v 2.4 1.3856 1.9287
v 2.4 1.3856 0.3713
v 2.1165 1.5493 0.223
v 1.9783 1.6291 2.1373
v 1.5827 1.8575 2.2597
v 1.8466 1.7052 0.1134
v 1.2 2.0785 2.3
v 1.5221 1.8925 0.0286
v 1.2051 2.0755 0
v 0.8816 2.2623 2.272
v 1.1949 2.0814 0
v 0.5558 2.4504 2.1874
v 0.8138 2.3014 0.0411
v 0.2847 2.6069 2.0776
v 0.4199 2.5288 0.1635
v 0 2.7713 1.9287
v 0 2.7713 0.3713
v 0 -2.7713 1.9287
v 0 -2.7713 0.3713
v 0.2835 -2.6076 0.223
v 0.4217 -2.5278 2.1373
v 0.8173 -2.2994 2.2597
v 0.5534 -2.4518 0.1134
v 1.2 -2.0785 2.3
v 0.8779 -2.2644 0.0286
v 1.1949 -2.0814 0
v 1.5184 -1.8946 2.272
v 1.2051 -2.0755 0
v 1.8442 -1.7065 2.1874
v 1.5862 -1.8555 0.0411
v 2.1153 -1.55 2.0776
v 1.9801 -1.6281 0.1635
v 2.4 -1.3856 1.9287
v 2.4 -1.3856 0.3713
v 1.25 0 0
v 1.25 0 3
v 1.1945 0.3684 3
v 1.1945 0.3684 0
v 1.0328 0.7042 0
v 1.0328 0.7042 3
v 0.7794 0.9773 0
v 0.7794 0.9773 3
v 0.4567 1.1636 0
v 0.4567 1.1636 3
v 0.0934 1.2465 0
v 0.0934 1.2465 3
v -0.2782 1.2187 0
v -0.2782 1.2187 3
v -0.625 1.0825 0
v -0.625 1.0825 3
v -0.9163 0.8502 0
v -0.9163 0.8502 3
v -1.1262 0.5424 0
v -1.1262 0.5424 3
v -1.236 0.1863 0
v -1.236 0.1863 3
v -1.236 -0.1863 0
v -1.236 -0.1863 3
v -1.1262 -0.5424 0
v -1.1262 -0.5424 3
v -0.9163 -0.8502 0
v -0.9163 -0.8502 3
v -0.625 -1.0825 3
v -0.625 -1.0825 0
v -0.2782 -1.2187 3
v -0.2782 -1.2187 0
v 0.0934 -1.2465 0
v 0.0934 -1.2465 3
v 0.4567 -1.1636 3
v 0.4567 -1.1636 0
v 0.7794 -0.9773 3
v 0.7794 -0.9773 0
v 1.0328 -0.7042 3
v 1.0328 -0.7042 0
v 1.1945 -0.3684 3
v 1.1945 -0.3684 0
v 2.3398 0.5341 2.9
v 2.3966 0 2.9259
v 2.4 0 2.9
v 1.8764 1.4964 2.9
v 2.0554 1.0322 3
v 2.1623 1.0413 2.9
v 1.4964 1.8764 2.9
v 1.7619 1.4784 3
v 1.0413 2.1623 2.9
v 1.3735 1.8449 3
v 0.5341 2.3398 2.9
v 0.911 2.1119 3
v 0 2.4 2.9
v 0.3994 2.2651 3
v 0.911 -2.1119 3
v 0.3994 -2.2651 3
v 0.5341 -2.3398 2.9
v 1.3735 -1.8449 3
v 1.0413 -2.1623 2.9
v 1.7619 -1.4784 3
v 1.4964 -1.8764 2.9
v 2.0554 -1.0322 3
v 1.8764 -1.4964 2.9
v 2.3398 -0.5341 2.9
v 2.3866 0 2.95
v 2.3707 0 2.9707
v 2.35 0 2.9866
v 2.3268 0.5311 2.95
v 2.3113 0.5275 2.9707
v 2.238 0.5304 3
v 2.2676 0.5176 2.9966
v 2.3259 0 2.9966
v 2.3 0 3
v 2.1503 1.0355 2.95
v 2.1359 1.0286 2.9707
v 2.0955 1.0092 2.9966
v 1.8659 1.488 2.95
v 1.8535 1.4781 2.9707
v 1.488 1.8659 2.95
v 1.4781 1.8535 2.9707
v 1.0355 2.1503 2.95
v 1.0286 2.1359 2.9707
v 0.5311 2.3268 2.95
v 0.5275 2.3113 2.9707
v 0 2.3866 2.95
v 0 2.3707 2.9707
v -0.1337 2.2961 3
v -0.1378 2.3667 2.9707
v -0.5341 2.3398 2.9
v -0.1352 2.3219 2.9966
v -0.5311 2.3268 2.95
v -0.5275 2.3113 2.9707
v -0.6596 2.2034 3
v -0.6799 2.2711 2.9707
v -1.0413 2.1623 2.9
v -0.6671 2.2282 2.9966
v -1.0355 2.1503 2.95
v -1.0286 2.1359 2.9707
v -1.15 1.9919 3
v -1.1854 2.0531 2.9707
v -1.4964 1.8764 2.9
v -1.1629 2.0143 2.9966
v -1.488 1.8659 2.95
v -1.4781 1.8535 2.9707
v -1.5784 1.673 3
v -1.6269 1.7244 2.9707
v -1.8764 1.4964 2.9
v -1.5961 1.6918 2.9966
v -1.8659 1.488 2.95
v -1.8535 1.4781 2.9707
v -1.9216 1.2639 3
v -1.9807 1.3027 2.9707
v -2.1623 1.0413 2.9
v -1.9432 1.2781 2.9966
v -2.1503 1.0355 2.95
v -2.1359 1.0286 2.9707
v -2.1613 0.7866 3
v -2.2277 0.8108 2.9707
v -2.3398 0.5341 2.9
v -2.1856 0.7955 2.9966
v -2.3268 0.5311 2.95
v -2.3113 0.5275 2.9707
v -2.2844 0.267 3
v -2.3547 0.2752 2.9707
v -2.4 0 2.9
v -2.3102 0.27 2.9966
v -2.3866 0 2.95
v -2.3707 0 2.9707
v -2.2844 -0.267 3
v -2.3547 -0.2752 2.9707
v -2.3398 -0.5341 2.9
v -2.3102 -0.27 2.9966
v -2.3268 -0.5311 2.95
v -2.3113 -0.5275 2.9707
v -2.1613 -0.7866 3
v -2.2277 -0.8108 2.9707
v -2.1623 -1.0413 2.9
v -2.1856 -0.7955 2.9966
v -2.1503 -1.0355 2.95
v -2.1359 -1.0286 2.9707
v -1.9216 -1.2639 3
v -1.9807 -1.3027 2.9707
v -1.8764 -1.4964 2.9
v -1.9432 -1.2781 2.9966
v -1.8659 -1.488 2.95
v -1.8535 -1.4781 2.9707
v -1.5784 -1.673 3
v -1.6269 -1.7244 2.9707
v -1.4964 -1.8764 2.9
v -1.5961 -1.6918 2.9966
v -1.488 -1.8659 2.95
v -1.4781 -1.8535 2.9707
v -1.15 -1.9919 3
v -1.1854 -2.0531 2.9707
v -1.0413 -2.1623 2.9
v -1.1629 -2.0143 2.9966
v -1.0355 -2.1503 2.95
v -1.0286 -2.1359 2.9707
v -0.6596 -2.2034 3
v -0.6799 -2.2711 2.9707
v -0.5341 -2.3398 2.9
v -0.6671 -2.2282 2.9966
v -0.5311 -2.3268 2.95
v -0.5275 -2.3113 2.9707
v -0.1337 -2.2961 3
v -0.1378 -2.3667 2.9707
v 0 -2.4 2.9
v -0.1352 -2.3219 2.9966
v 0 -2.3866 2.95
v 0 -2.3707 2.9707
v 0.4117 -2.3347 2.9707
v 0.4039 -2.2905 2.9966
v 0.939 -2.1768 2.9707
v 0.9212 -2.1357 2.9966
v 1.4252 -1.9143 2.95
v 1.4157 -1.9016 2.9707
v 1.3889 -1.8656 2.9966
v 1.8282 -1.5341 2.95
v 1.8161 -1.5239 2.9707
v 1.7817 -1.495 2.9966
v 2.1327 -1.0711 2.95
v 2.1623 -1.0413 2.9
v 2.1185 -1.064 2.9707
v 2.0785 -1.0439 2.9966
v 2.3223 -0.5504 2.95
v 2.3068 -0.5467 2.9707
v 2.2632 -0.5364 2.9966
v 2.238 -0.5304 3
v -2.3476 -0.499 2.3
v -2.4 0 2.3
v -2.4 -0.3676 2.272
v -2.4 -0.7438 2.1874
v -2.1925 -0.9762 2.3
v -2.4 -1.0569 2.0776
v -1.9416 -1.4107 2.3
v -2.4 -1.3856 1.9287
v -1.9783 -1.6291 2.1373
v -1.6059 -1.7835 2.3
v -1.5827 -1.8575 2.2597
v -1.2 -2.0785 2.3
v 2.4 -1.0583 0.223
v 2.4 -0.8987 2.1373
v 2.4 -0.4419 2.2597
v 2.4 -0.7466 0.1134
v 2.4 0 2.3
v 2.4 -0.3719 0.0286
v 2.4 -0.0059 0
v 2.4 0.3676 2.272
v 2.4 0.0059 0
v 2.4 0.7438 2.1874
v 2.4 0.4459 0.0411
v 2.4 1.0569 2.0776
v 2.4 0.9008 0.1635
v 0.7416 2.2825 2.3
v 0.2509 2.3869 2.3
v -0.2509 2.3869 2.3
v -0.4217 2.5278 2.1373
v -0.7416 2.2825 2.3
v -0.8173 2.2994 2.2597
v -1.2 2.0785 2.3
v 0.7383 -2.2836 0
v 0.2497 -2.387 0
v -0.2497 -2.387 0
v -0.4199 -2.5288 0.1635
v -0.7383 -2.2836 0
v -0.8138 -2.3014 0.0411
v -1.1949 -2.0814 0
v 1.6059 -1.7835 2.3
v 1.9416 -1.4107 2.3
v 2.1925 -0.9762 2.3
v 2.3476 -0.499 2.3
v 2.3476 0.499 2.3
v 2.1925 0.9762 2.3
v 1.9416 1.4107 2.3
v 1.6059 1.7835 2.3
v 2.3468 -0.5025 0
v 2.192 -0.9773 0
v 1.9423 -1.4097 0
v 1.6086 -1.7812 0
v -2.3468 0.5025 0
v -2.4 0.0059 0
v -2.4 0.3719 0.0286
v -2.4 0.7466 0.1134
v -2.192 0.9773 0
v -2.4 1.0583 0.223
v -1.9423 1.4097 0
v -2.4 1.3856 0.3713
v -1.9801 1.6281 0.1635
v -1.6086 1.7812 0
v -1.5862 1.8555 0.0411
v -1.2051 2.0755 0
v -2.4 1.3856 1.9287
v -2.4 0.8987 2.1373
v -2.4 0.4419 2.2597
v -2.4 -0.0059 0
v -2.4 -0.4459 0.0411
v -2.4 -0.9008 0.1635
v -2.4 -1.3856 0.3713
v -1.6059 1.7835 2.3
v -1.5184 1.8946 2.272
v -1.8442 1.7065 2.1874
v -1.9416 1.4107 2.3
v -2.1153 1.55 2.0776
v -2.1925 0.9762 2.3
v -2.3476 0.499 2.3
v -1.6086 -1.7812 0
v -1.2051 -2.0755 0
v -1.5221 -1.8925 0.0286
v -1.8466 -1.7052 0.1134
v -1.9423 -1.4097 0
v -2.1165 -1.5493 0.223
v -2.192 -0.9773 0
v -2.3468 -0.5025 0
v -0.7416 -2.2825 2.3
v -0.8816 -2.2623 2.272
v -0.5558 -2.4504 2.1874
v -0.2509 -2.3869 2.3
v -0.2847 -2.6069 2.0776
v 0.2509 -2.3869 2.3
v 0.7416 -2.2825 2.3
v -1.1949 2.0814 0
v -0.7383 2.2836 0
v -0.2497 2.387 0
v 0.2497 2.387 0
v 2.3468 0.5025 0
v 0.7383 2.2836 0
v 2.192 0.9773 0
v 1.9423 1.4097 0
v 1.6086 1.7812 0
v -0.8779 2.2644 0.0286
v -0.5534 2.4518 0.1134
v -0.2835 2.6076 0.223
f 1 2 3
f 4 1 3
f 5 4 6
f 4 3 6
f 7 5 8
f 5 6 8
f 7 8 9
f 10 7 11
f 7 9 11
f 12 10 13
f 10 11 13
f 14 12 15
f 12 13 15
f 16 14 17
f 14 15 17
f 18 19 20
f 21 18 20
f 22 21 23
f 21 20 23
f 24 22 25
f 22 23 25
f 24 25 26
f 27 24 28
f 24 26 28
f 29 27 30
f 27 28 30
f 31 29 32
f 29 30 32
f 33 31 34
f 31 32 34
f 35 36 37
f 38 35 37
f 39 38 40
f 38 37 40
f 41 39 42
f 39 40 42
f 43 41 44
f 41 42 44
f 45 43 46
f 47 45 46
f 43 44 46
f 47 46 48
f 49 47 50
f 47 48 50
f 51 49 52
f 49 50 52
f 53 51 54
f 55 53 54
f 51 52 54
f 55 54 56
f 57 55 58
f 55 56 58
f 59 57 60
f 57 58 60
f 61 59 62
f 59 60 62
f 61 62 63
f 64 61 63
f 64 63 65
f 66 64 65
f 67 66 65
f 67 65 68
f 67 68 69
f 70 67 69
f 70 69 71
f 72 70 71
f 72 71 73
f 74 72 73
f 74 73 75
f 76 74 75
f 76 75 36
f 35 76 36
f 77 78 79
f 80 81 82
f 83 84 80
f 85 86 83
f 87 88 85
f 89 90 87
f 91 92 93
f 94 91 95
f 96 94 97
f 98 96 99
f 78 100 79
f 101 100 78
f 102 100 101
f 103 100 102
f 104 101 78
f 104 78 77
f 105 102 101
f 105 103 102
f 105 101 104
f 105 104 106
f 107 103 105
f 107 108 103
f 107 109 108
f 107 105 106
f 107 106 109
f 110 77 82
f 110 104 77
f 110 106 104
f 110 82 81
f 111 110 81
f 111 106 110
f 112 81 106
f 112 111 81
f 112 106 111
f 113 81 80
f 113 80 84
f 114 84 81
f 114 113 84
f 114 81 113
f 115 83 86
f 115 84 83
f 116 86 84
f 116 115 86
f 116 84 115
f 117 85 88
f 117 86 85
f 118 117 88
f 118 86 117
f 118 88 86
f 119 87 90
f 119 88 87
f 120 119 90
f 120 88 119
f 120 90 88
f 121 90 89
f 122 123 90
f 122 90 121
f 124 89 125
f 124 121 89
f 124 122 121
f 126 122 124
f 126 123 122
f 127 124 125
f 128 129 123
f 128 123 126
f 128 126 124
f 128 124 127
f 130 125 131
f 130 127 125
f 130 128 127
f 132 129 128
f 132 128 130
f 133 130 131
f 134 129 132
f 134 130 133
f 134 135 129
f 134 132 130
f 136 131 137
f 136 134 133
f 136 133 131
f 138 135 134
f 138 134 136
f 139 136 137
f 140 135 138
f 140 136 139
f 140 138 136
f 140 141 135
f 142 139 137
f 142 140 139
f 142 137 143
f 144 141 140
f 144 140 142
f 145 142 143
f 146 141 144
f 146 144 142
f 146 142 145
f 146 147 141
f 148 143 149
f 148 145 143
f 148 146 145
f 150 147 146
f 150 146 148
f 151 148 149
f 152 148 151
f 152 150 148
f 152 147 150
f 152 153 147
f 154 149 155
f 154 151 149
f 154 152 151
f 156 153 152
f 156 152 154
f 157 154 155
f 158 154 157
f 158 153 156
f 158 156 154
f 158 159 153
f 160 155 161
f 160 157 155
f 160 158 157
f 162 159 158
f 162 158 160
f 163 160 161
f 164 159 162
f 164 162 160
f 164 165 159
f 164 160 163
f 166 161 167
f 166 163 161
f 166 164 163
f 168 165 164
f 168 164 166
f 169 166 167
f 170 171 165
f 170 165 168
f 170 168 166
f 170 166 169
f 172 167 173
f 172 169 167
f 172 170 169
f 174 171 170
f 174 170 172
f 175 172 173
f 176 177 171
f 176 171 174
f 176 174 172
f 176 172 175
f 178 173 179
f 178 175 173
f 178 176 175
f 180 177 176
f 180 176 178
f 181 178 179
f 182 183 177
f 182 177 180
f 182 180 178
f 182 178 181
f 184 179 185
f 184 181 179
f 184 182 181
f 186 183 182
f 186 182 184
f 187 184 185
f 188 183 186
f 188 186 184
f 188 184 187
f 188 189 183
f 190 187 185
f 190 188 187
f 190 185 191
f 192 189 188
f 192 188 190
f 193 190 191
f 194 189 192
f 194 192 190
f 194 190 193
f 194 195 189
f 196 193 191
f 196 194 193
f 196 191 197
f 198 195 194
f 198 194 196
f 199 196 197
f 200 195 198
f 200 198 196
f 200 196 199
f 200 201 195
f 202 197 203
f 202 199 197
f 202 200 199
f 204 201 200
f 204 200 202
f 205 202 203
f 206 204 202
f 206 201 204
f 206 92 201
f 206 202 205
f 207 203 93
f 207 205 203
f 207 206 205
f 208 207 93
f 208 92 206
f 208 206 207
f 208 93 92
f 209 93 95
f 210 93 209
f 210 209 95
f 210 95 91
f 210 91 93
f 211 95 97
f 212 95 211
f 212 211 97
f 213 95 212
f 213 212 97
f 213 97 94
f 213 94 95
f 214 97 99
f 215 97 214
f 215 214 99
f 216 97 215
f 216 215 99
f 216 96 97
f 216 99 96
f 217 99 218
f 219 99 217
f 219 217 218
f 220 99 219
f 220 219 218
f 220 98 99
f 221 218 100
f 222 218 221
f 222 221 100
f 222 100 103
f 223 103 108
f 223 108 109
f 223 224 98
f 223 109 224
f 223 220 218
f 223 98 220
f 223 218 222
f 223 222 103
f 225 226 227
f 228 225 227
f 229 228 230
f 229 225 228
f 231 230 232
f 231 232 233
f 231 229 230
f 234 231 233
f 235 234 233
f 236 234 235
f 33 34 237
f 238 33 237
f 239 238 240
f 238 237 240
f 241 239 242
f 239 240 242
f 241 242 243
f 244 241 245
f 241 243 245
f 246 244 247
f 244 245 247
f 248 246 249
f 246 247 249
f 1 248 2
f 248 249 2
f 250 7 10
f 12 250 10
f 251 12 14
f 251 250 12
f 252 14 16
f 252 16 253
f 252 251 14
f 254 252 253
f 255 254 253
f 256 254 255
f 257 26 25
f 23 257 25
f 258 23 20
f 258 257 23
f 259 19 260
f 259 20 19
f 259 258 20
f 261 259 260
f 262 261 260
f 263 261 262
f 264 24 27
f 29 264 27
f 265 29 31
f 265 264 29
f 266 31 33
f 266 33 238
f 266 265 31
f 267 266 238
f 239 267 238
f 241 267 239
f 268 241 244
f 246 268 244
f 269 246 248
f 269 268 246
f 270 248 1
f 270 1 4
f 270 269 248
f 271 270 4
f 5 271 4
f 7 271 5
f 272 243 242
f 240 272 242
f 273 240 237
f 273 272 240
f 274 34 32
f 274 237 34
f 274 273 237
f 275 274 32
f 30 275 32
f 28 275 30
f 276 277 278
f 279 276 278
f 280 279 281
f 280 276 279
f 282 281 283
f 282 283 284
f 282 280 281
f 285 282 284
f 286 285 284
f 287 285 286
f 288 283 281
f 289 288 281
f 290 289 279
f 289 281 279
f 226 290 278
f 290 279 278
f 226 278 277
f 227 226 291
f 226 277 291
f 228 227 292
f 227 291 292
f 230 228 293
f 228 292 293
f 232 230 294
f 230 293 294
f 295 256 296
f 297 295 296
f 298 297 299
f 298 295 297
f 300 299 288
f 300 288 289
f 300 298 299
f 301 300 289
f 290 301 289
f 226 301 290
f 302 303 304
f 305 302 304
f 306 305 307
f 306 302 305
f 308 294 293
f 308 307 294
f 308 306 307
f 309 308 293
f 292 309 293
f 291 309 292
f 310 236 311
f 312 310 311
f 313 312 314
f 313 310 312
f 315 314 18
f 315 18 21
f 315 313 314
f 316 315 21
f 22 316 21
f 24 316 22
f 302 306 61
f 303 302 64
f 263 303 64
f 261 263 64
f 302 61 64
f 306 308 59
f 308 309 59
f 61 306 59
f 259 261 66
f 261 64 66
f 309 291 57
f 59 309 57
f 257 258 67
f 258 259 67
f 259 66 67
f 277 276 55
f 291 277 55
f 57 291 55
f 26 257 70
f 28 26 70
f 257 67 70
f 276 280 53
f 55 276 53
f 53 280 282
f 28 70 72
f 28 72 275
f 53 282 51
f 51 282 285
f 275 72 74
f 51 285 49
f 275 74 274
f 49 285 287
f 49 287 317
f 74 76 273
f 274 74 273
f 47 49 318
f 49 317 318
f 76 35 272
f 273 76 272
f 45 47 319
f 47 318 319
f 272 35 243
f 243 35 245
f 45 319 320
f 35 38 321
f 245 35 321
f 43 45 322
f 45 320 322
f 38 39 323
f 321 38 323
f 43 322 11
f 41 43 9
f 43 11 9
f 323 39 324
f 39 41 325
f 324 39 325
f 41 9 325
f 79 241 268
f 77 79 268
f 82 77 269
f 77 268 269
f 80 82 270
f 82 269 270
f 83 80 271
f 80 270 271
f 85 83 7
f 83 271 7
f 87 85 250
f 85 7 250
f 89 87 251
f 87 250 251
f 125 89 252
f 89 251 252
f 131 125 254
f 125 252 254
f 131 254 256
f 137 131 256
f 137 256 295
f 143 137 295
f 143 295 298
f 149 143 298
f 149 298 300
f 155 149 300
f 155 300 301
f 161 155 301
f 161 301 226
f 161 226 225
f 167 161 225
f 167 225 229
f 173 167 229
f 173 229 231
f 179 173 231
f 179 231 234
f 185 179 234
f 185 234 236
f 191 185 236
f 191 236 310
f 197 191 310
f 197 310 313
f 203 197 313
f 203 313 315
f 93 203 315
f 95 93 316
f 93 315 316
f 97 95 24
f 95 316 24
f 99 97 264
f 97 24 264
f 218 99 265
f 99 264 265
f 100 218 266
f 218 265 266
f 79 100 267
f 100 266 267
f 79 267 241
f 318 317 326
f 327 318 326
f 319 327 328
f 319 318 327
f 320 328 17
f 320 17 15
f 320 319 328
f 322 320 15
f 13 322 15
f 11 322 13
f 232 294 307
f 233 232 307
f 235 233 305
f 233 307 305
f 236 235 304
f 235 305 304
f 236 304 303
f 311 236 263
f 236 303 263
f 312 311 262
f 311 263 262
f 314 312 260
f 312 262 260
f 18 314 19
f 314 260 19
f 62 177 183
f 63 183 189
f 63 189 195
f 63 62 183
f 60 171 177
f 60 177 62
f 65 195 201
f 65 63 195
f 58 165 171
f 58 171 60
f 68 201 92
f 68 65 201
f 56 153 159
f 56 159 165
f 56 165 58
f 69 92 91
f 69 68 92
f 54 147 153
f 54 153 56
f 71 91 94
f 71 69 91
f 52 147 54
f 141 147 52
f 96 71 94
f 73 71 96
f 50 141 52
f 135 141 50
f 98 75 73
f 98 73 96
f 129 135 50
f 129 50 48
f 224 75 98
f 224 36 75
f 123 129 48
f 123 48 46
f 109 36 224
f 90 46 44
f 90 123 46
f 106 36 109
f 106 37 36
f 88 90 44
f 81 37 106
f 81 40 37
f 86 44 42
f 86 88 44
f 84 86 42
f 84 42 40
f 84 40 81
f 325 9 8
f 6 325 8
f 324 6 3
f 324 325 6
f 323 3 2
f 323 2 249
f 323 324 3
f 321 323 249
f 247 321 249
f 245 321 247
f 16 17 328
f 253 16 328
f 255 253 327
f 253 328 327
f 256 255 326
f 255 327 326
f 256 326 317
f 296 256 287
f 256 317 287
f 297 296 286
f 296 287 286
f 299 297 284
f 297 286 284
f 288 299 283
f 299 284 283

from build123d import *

# Parameters (mm, degrees)
EXTRUDE_1_DEPTH      = 2.3
SKETCH_2_R           = 2.4
EXTRUDE_2_DEPTH      = 0.7
SKETCH_3_R           = 1.25
CUT_EXTRUDE_1_DEPTH  = 5.737087713
SKETCH_4_OUTSIDE_W   = 10.384
SKETCH_4_OUTSIDE_H   = 11.126
SKETCH_4_OUTSIDE_R   = 2.400007284
CUT_EXTRUDE_10_DEPTH = 1
CUT_EXTRUDE_10_DRAFT = -45
SKETCH_2_4_OUTSIDE_W = 10.384
SKETCH_2_4_OUTSIDE_H = 11.126
SKETCH_2_4_OUTSIDE_R = 2.4
CUT_EXTRUDE_11_DEPTH = 1
CUT_EXTRUDE_11_DRAFT = -45
FILLET_1_R           = 0.1


with BuildPart() as part:
    # 草图1 → 凸台-拉伸1 (new body)
    with BuildSketch(Plane.XY):
        Polygon((0, 2.771281292), (-2.4, 1.385640646), (-2.4, -1.385640646), (0, -2.771281292), (2.4, -1.385640646), (2.4, 1.385640646), align=None)
    extrude(amount=EXTRUDE_1_DEPTH)

    # 草图2 → 凸台-拉伸2 (add)
    with BuildSketch(Plane.XY.offset(2.3)):
        Circle(SKETCH_2_R)
    extrude(amount=EXTRUDE_2_DEPTH)

    # 草图3 → 切除-拉伸1 (cut, through all)
    with BuildSketch(Plane.XY.offset(3)):
        Circle(SKETCH_3_R)
    extrude(amount=-CUT_EXTRUDE_1_DEPTH, mode=Mode.SUBTRACT)


with BuildPart() as cut_extrude_10_tool:
    # 草图4 outside → 切除-拉伸10 (with draft: the straight prism first)
    with BuildSketch(Plane(origin=(0, 0, 0), x_dir=(-1, 0, 0), z_dir=(0, 0, -1))):
        Rectangle(SKETCH_4_OUTSIDE_W, SKETCH_4_OUTSIDE_H)
        Circle(SKETCH_4_OUTSIDE_R, mode=Mode.SUBTRACT)
    extrude(amount=-CUT_EXTRUDE_10_DEPTH)
    # 切除-拉伸10: the draft: its side faces are tilted about the plane it starts from
    cut_extrude_10_sides = [cut_extrude_10_tool.faces().sort_by_distance(p)[0] for p in [
        (0, -5.563, 0.5),
        (-5.192, 0, 0.5),
        (0, 5.563, 0.5),
        (5.192, 0, 0.5),
        (2.400007284, 0, 0.5),
    ]]
    draft(cut_extrude_10_sides, Plane(origin=(0, 0, 0), x_dir=(-1, 0, 0), z_dir=(0, 0, -1)), CUT_EXTRUDE_10_DRAFT)


with BuildPart() as part_1:
    add(part.part)

    # 切除-拉伸10: cut by cut_extrude_10_tool
    add(cut_extrude_10_tool.part, mode=Mode.SUBTRACT)


with BuildPart() as cut_extrude_11_tool:
    # 草图2<4> outside → 切除-拉伸11 (with draft: the straight prism first)
    with BuildSketch(Plane.XY.offset(2.3)):
        Rectangle(SKETCH_2_4_OUTSIDE_W, SKETCH_2_4_OUTSIDE_H)
        Circle(SKETCH_2_4_OUTSIDE_R, mode=Mode.SUBTRACT)
    extrude(amount=-CUT_EXTRUDE_11_DEPTH)
    # 切除-拉伸11: the draft: its side faces are tilted about the plane it starts from
    cut_extrude_11_sides = [cut_extrude_11_tool.faces().sort_by_distance(p)[0] for p in [
        (0, -5.563, 1.8),
        (5.192, 0, 1.8),
        (0, 5.563, 1.8),
        (-5.192, 0, 1.8),
        (-2.4, 0, 1.8),
    ]]
    draft(cut_extrude_11_sides, Plane.XY.offset(2.3), CUT_EXTRUDE_11_DRAFT)


with BuildPart() as part_2:
    add(part_1.part)

    # 切除-拉伸11: cut by cut_extrude_11_tool
    add(cut_extrude_11_tool.part, mode=Mode.SUBTRACT)

    # 圆角1
    fillet_1_edges = [part_2.edges().sort_by_distance(p)[0] for p in [
        (-2.4, 0, 3),
    ]]
    fillet(fillet_1_edges, radius=FILLET_1_R)


solid = part_2.part
